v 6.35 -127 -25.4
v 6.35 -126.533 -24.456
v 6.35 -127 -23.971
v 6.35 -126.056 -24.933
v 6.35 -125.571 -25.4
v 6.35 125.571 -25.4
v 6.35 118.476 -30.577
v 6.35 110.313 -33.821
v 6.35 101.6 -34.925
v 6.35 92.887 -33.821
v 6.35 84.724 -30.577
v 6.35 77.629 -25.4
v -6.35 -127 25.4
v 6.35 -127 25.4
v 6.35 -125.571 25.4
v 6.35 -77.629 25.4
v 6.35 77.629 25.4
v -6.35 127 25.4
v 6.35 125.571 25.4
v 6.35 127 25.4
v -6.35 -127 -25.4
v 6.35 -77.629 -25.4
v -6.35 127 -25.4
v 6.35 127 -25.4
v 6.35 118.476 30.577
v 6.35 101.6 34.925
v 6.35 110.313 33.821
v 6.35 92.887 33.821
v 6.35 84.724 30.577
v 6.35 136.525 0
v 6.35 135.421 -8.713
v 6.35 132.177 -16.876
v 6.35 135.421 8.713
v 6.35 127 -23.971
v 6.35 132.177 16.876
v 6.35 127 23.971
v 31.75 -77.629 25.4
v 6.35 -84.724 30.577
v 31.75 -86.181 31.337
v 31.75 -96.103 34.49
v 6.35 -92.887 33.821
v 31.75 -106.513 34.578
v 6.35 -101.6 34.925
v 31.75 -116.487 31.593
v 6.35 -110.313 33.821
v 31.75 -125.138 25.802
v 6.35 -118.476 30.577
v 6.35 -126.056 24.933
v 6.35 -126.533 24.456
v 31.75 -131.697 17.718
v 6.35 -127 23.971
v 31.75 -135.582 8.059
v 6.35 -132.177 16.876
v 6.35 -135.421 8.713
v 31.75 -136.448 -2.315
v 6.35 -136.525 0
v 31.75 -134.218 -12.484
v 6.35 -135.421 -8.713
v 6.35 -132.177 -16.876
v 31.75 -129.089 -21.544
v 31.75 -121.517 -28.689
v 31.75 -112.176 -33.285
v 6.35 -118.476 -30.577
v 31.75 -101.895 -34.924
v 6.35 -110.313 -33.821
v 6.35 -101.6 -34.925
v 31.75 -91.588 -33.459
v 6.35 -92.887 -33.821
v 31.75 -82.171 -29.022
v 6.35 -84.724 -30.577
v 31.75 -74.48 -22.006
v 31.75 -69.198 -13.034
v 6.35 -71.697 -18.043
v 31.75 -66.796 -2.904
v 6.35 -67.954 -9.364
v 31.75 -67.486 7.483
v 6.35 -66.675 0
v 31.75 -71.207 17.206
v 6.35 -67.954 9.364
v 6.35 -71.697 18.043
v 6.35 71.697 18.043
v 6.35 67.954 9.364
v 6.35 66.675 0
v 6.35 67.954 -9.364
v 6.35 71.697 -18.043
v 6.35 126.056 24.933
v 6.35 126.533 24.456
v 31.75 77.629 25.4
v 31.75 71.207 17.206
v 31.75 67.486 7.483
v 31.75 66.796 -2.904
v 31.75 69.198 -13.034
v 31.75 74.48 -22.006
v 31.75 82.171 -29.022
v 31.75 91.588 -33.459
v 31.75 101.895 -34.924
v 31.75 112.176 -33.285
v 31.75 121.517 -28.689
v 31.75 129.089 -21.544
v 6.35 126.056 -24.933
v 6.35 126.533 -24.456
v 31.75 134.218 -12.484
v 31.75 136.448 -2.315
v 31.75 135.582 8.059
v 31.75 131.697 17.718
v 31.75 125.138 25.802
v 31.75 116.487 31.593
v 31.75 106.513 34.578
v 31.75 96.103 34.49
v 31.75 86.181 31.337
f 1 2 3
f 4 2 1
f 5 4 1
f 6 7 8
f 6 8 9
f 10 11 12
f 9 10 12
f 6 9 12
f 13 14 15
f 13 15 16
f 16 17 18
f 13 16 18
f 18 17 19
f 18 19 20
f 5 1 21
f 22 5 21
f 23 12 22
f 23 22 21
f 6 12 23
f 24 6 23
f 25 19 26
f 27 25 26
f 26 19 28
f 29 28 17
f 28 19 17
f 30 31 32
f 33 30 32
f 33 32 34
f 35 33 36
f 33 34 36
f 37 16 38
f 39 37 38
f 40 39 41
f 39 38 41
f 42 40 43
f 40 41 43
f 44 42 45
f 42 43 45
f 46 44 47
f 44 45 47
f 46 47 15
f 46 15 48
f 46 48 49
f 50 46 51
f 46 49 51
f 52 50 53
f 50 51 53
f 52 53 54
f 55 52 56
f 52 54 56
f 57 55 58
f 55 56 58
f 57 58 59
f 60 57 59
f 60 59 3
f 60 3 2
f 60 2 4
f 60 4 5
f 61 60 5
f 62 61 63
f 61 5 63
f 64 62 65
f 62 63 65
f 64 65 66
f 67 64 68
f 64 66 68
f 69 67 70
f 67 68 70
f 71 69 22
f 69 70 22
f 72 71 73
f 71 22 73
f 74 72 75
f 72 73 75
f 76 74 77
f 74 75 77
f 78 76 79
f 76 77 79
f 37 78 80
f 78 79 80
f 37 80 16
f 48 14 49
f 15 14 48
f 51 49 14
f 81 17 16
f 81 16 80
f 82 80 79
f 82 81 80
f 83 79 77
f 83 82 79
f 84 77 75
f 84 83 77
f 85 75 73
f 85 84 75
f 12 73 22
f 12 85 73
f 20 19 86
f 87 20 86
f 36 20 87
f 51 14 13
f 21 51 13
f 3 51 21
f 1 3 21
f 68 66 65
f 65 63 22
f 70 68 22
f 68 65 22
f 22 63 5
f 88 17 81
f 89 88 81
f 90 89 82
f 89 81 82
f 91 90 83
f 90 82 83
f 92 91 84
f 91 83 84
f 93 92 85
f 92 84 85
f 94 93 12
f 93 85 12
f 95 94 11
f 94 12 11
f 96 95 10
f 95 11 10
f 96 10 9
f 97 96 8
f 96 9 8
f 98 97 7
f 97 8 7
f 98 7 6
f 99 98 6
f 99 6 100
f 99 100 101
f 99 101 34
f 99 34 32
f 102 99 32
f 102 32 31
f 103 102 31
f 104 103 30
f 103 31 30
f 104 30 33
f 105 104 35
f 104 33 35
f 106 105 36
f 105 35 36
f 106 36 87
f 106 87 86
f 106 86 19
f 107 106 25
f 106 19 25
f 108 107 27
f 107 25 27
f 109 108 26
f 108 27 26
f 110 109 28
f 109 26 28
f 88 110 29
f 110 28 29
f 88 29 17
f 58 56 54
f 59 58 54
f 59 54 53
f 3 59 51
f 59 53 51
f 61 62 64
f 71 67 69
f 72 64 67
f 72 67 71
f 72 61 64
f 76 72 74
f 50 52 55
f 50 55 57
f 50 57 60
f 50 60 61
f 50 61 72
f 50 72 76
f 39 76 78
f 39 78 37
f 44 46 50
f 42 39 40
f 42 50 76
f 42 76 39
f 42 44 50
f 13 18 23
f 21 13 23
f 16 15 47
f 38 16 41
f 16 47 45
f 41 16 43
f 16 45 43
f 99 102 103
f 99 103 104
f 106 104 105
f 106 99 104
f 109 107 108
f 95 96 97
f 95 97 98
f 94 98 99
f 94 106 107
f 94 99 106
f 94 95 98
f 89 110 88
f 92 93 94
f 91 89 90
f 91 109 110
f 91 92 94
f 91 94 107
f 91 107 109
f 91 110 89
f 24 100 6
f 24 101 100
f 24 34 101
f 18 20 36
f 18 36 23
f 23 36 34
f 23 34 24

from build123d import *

# Parameters (mm, degrees)
SKETCH1_W           = 50.8
SKETCH1_H           = 254
BOSS_EXTRUDE1_DEPTH = 6.35
SKETCH2_R           = 34.925
BOSS_EXTRUDE2_DEPTH = 25.4


with BuildPart() as part:
    # Sketch1 → Boss-Extrude1 (new, symmetric)
    with BuildSketch(Plane(origin=(0, 0, 0), x_dir=(0, 0, -1), z_dir=(1, 0, 0))):
        Rectangle(SKETCH1_W, SKETCH1_H)
    extrude(amount=BOSS_EXTRUDE1_DEPTH, both=True)

    # Sketch2 → Boss-Extrude2 (add)
    with BuildSketch(Plane(origin=(6.35, 0, 0), x_dir=(0, 0, -1), z_dir=(1, 0, 0))):
        with Locations(Location((0, 101.6, 0), (0, 0, 223.341758227))):
            Circle(SKETCH2_R)
        with Locations(Location((0, -101.6, 0), (0, 0, 136.658241773))):
            Circle(SKETCH2_R)
    extrude(amount=BOSS_EXTRUDE2_DEPTH)


solid = part.part
